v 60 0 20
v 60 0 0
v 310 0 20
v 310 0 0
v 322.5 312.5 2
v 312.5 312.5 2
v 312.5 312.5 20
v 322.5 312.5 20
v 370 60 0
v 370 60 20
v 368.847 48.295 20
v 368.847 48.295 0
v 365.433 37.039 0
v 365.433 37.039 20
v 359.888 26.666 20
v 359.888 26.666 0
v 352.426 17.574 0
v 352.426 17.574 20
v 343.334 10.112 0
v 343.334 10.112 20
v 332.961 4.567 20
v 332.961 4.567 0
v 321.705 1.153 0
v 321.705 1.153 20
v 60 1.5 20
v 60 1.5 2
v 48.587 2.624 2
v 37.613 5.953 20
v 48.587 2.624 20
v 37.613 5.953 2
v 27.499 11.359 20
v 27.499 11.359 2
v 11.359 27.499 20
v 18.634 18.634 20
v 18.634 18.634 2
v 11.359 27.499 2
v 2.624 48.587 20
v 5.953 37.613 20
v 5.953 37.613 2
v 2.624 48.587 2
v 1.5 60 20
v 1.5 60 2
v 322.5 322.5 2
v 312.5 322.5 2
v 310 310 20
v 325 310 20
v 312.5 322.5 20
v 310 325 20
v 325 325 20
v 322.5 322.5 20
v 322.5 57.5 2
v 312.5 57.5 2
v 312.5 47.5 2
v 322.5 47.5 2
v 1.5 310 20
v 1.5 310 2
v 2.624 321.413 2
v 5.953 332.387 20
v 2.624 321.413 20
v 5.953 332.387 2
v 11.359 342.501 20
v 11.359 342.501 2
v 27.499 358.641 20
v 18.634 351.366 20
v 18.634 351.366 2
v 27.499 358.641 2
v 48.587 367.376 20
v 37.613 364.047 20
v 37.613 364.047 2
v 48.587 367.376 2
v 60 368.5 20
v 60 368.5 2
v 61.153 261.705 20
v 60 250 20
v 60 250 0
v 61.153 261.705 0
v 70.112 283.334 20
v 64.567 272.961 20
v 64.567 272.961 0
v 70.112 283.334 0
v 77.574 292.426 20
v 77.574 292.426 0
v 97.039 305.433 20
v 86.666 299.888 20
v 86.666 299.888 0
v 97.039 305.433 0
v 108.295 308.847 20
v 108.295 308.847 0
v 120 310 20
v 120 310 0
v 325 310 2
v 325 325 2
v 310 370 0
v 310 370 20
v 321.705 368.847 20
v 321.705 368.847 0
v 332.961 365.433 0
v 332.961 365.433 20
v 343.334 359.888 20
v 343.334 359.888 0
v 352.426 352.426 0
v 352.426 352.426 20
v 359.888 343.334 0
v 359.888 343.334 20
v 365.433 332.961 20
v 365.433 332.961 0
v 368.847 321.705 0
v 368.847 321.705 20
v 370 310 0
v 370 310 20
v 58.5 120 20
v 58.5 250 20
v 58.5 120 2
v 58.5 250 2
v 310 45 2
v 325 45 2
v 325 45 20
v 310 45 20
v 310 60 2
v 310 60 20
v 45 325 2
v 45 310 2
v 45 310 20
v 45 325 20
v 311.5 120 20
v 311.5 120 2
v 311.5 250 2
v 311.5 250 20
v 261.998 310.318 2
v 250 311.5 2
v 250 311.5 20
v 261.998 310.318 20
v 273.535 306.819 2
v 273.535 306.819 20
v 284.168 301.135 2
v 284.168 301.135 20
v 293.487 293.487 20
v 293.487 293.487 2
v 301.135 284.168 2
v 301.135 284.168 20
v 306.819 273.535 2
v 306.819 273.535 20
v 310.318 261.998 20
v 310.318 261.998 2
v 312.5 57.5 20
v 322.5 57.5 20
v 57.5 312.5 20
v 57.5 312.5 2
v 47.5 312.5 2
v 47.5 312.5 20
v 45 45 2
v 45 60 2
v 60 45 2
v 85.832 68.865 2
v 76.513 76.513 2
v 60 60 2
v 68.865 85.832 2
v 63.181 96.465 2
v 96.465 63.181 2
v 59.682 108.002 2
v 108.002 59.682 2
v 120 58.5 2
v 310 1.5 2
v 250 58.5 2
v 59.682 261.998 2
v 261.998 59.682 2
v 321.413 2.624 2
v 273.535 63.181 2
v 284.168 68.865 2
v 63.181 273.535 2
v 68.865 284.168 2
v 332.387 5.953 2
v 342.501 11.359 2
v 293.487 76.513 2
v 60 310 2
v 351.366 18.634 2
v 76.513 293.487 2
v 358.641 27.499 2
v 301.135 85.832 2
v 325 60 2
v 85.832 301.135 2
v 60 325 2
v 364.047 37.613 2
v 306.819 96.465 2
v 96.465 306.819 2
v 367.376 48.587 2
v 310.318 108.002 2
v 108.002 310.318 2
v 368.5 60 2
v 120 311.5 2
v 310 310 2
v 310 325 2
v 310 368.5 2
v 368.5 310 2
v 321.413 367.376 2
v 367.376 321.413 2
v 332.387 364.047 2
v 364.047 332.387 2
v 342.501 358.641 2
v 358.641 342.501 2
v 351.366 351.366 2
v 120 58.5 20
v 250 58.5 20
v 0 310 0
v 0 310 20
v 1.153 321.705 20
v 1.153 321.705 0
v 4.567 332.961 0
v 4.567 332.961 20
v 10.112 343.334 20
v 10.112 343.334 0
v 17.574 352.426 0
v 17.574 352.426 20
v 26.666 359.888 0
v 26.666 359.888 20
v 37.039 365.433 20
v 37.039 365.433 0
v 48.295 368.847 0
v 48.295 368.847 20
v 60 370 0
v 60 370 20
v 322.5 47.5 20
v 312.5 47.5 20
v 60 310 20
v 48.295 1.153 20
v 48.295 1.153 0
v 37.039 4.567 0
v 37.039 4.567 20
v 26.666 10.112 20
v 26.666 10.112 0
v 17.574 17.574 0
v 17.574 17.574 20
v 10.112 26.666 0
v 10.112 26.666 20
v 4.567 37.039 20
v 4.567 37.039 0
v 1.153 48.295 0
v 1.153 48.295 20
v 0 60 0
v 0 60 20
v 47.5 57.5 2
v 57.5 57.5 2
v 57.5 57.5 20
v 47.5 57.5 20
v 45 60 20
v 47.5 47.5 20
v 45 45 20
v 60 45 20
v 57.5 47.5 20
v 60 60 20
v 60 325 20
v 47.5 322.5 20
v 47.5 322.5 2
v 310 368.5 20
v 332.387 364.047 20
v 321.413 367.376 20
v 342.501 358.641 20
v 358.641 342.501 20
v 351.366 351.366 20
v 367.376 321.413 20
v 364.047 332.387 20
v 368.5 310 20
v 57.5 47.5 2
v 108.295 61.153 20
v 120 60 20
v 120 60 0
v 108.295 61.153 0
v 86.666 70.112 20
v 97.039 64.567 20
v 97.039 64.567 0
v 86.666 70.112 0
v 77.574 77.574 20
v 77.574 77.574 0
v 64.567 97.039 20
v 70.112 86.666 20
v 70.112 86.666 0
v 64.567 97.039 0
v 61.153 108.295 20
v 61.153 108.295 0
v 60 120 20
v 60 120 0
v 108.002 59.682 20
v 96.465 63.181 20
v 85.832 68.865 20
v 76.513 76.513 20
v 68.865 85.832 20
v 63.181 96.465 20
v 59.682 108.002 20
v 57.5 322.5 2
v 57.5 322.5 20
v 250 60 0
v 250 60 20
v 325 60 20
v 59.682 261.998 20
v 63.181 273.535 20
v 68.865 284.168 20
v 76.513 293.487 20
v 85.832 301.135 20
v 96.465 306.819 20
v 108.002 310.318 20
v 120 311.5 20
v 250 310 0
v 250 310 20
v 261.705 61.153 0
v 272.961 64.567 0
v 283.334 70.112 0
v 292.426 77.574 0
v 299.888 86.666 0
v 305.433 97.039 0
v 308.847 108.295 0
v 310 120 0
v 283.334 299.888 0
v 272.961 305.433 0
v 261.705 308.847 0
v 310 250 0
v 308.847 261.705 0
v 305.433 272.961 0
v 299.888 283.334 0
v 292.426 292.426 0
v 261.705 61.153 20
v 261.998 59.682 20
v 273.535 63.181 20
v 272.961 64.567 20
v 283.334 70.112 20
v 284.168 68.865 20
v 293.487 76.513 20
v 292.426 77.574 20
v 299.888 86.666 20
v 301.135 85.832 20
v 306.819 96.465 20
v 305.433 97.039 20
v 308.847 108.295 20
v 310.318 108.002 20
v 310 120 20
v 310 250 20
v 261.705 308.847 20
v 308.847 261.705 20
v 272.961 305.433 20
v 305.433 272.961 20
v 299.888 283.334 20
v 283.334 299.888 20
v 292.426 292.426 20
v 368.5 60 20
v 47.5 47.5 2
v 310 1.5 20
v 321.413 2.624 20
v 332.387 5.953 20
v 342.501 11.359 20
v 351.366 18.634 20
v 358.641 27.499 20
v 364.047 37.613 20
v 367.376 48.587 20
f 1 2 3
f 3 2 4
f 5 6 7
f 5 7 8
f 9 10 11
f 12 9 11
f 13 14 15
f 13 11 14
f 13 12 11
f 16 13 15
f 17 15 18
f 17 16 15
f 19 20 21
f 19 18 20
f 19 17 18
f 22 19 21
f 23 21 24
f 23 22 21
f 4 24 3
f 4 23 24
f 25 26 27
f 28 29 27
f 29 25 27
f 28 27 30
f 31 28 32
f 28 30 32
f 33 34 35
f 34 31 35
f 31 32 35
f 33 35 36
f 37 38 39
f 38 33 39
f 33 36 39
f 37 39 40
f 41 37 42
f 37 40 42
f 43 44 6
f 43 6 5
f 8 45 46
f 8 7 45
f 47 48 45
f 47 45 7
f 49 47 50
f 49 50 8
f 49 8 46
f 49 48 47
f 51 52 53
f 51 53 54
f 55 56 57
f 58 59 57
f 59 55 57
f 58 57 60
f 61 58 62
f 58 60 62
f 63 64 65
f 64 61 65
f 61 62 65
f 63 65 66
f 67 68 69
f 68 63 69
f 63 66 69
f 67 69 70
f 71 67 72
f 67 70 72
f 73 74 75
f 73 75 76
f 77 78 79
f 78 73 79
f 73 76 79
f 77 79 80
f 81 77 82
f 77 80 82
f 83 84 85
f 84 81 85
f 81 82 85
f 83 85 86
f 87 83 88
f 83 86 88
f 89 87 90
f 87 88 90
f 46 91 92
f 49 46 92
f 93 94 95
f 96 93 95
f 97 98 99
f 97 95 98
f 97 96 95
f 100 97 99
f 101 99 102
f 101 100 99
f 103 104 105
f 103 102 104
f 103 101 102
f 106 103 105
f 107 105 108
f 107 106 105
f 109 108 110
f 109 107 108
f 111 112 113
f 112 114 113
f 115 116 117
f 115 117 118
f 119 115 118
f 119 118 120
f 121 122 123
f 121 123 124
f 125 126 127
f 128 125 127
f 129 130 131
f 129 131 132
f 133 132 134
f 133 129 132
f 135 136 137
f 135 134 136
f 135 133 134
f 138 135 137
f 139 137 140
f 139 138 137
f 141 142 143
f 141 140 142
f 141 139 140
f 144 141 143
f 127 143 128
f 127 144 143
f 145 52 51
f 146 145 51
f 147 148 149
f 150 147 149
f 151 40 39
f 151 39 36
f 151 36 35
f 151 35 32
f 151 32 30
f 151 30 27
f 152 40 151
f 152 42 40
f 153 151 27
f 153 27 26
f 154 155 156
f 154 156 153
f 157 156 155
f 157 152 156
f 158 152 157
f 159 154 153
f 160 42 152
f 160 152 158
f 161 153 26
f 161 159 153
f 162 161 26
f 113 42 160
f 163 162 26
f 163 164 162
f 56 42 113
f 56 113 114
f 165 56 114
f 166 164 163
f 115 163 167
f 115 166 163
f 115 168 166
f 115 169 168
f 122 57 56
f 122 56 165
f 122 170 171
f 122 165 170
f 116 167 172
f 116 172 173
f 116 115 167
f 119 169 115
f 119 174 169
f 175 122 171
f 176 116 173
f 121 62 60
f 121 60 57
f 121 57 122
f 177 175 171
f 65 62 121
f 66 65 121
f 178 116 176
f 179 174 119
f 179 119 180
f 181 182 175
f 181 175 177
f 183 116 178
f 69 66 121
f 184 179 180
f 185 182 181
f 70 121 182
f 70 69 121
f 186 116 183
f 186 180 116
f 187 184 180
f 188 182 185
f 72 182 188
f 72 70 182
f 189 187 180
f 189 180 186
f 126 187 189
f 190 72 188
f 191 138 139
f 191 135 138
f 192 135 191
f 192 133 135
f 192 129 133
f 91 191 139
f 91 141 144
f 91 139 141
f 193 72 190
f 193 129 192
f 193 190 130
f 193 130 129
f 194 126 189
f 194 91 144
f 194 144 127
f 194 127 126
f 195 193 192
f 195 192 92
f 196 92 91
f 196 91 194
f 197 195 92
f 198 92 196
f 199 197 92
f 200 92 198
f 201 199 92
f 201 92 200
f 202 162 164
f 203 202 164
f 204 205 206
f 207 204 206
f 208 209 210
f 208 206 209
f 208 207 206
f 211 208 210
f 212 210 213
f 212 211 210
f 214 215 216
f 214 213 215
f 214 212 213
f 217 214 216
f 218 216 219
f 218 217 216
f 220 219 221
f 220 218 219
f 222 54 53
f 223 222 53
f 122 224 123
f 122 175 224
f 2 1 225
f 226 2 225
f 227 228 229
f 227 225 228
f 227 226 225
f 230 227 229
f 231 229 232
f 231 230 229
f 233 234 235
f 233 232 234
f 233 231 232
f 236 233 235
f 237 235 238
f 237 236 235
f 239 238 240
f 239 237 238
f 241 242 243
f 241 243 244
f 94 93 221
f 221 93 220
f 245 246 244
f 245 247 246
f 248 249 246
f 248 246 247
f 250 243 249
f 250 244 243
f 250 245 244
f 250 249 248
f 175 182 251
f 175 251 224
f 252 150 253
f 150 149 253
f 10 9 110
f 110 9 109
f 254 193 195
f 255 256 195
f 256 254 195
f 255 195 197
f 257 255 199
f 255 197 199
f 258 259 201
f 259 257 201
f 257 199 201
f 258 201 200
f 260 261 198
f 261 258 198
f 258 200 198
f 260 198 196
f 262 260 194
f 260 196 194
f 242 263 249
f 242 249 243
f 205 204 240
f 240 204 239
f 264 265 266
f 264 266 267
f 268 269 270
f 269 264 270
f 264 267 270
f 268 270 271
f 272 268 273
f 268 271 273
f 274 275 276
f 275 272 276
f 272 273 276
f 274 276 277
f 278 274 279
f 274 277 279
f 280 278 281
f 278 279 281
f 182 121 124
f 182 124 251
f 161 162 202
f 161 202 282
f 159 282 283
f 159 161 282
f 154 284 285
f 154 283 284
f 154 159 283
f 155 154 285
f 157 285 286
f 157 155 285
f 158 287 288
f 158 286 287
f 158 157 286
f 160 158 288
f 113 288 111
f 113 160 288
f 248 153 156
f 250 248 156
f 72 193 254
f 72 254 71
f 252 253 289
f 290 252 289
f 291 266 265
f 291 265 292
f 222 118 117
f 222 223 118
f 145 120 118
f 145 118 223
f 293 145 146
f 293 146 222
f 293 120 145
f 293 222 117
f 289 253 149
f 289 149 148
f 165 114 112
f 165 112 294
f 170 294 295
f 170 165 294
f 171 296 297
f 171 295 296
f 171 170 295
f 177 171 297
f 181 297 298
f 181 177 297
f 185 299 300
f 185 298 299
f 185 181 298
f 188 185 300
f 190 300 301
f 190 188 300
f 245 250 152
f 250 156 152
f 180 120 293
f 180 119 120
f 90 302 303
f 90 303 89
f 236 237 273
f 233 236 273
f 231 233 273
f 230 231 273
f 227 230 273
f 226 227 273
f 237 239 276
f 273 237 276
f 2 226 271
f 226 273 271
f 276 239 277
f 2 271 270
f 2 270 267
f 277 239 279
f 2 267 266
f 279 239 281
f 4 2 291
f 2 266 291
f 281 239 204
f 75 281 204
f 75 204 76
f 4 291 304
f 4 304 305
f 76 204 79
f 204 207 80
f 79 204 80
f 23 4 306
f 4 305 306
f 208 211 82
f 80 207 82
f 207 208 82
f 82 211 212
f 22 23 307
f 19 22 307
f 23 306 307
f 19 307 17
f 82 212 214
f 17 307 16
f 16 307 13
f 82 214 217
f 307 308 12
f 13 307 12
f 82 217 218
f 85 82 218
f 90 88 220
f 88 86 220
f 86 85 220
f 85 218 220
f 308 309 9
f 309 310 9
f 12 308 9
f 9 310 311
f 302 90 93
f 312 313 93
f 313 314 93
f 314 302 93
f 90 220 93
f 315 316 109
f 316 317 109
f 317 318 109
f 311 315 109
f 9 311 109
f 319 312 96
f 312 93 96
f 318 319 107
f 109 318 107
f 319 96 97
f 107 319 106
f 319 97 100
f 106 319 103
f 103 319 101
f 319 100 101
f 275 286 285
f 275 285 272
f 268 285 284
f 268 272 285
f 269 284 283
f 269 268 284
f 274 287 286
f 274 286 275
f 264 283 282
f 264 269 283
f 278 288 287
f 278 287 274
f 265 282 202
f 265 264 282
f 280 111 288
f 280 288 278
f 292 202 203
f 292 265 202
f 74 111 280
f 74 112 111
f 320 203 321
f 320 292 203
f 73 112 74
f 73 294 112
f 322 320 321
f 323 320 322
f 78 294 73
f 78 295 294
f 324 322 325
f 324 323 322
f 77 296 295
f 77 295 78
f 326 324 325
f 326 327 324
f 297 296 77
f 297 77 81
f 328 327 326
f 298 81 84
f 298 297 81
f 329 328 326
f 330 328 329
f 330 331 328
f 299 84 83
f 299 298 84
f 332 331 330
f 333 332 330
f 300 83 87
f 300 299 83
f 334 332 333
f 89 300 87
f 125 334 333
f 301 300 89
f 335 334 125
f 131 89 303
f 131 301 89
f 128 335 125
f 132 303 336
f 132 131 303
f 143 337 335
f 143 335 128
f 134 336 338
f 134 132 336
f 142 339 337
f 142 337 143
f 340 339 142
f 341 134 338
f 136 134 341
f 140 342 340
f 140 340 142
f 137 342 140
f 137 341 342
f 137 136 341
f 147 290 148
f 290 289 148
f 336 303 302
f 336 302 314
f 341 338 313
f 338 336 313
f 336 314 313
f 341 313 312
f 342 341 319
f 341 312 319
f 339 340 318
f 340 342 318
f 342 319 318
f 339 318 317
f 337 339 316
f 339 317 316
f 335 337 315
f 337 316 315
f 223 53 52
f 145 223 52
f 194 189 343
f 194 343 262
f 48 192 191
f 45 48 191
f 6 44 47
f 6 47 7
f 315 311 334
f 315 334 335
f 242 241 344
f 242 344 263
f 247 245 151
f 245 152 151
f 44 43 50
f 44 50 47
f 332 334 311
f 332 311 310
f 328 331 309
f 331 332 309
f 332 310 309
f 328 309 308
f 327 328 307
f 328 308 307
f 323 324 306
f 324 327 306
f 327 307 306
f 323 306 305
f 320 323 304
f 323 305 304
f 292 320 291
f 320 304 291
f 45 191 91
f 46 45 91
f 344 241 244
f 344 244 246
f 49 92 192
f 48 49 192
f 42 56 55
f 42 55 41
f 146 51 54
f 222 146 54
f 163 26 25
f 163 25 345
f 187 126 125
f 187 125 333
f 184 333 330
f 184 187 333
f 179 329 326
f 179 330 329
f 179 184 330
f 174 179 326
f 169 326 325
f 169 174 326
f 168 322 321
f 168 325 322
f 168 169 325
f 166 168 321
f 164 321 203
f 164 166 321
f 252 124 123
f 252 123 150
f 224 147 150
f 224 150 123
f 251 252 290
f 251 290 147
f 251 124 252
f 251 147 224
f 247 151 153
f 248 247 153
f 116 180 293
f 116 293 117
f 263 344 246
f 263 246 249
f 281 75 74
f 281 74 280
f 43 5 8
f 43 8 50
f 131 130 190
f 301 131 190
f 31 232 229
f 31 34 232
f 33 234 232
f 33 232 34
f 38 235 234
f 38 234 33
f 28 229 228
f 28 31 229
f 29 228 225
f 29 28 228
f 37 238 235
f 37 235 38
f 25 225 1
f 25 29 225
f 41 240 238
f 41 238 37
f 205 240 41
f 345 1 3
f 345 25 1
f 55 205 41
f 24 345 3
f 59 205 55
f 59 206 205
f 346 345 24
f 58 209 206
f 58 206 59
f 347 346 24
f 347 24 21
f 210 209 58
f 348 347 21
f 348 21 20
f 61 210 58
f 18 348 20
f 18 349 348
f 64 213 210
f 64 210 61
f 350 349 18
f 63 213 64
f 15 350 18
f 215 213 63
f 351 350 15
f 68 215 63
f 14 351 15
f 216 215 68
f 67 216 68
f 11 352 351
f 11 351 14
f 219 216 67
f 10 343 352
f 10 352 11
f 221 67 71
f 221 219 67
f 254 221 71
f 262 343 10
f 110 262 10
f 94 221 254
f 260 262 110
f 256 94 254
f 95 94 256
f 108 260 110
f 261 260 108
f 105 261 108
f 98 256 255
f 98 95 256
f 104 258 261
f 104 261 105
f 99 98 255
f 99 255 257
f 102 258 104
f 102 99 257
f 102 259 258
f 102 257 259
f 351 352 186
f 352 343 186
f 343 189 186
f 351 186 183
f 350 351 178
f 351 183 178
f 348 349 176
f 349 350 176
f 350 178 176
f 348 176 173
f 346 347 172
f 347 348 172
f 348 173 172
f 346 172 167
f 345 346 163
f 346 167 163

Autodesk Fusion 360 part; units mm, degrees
sketch "Skizze1" plane through (0, 0, 0) normal (0, 0, 1) x (1, 0, 0)
  line L0 (60, 0) -> (310, 0)
  line L1 (370, 60) -> (370, 310)
  line L2 (310, 370) -> (60, 370)
  line L3 (0, 310) -> (0, 60)
  line L4 (120, 60) -> (250, 60)
  line L5 (310, 120) -> (310, 250)
  line L6 (250, 310) -> (120, 310)
  line L7 (60, 250) -> (60, 120)
  arc A0 (120, 310) -> (60, 250) centre (120, 250) ccw
  arc A1 (310, 250) -> (250, 310) centre (250, 250) ccw
  arc A2 (250, 60) -> (310, 120) centre (250, 120) ccw
  arc A3 (60, 120) -> (120, 60) centre (120, 120) ccw
  arc A4 (310, 0) -> (370, 60) centre (310, 60) ccw
  arc A5 (0, 60) -> (60, 0) centre (60, 60) ccw
  arc A6 (60, 370) -> (0, 310) centre (60, 310) ccw
  arc A7 (370, 310) -> (310, 370) centre (310, 310) ccw
  line L8 (368.5, 60) -> (368.5, 310)
  arc A8 (368.5, 310) -> (310, 368.5) centre (310, 310) ccw
  line L9 (310, 368.5) -> (60, 368.5)
  arc A9 (60, 368.5) -> (1.5, 310) centre (60, 310) ccw
  line L10 (1.5, 310) -> (1.5, 60)
  arc A10 (1.5, 60) -> (60, 1.5) centre (60, 60) ccw
  line L11 (60, 1.5) -> (310, 1.5)
  arc A11 (310, 1.5) -> (368.5, 60) centre (310, 60) ccw
  line L12 (120, 58.5) -> (250, 58.5)
  arc A12 (250, 58.5) -> (311.5, 120) centre (250, 120) ccw
  line L13 (311.5, 120) -> (311.5, 250)
  arc A13 (311.5, 250) -> (250, 311.5) centre (250, 250) ccw
  line L14 (250, 311.5) -> (120, 311.5)
  arc A14 (120, 311.5) -> (58.5, 250) centre (120, 250) ccw
  line L15 (58.5, 250) -> (58.5, 120)
  arc A15 (58.5, 120) -> (120, 58.5) centre (120, 120) ccw
  line L16 (105, 5) -> (265, 5)
  line L17 (265, 5) -> (265, 55)
  line L18 (265, 55) -> (105, 55)
  line L19 (105, 55) -> (105, 5)
  line L20 (310, 60) -> (325, 60)
  line L21 (325, 60) -> (325, 45)
  line L22 (325, 45) -> (310, 45)
  line L23 (310, 45) -> (310, 60)
  line L24 (312.5, 57.5) -> (322.5, 57.5)
  line L25 (322.5, 57.5) -> (322.5, 47.5)
  line L26 (322.5, 47.5) -> (312.5, 47.5)
  line L27 (312.5, 47.5) -> (312.5, 57.5)
  line L28 (310, 310) -> (325, 310)
  line L29 (325, 310) -> (325, 325)
  line L30 (325, 325) -> (310, 325)
  line L31 (310, 325) -> (310, 310)
  line L32 (60, 310) -> (45, 310)
  line L33 (45, 310) -> (45, 325)
  line L34 (45, 325) -> (60, 325)
  line L35 (60, 325) -> (60, 310)
  line L36 (57.5, 312.5) -> (47.5, 312.5)
  line L37 (47.5, 312.5) -> (47.5, 322.5)
  line L38 (47.5, 322.5) -> (57.5, 322.5)
  line L39 (57.5, 322.5) -> (57.5, 312.5)
  line L40 (322.5, 312.5) -> (322.5, 322.5)
  line L41 (322.5, 322.5) -> (312.5, 322.5)
  line L42 (312.5, 322.5) -> (312.5, 312.5)
  line L43 (312.5, 312.5) -> (322.5, 312.5)
  line L44 (60, 60) -> (45, 60)
  line L45 (45, 60) -> (45, 45)
  line L46 (45, 45) -> (60, 45)
  line L47 (60, 45) -> (60, 60)
  line L48 (47.5, 47.5) -> (57.5, 47.5)
  line L49 (57.5, 47.5) -> (57.5, 57.5)
  line L50 (57.5, 57.5) -> (47.5, 57.5)
  line L51 (47.5, 57.5) -> (47.5, 47.5)
  circle A16 centre (110, 50) radius 5
  circle A17 centre (110, 10) radius 5
  circle A18 centre (260, 50) radius 5
  circle A19 centre (260, 10) radius 5
  point P0 (370, 0)
  point P1 (0, 370)
  dimension "d3" = 370
  dimension "d4" = 370
  dimension "d6" = 60
  dimension "d7" = -1.5
  dimension "d8" = 1.5
  dimension "d11" = 160
  dimension "d12" = 50
  dimension "d13" = 15
  dimension "d14" = 15
  dimension "d15" = 2.5
  dimension "d16" = 15
  dimension "d17" = 15
  dimension "d18" = 15
  dimension "d19" = 15
  dimension "d20" = 2.5
  dimension "d21" = -2.5
  dimension "d22" = 15
  dimension "d23" = 15
  dimension "d24" = -2.5
  dimension "d35" = 10
  dimension "d36" = 10
  dimension "d37" = 10
  dimension "d38" = 10
extrude "Extrusion1" add sketch "Skizze1" along normal blind 2 contours L16 L19 A17 | L16 L17 L18 L19 A16 A17 A18 A19 | A17 | L16 L17 A19 | A19 | L18 L19 A16 | A16 | L17 L18 A18 | A18 | L20 L21 L22 L23 | L24 L25 L26 L27 | L28 L29 L30 L31 | L32 L33 L34 L35 | L36 L37 L38 L39 | L40 L41 L42 L43 | L44 L45 L46 L47 | L48 L49 L50 L51 makes body 1 at (50, 55, 0) makes body 2 at (315, 55, 0) makes body 3 at (55, 315, 0) makes body 4 at (158.3333, 38.3333, 0) makes body 5 at (315, 320, 0)
extrude "Extrusion2" add sketch "Skizze1" along normal blind 2 contours L8 A8 L9 A9 L10 A10 L11 A11 bodies 1 2 3 4 5
extrude "Extrusion3" add sketch "Skizze1" along normal blind 20 contours L0 L1 L2 L3 A4 A5 A6 A7 | L12 A12 L13 A13 L14 A14 L15 A15 bodies 1
extrude "Extrusion4" add sketch "Skizze1" along normal blind 2 separate body contours L24 L25 L26 L27 | L36 L37 L38 L39 | L40 L41 L42 L43 | L48 L49 L50 L51 makes body 6 at (319.1667, 315.8333, 0) makes body 7 at (50.8333, 54.1667, 0) makes body 8 at (54.1667, 315.8333, 0) makes body 9 at (315.8333, 54.1667, 0)
extrude "Extrusion5" add sketch "Skizze1" along normal blind 20 contours L20 L21 L22 L23 | L28 L29 L30 L31 | L32 L33 L34 L35 | L44 L45 L46 L47 bodies 1 6 7 8 9
